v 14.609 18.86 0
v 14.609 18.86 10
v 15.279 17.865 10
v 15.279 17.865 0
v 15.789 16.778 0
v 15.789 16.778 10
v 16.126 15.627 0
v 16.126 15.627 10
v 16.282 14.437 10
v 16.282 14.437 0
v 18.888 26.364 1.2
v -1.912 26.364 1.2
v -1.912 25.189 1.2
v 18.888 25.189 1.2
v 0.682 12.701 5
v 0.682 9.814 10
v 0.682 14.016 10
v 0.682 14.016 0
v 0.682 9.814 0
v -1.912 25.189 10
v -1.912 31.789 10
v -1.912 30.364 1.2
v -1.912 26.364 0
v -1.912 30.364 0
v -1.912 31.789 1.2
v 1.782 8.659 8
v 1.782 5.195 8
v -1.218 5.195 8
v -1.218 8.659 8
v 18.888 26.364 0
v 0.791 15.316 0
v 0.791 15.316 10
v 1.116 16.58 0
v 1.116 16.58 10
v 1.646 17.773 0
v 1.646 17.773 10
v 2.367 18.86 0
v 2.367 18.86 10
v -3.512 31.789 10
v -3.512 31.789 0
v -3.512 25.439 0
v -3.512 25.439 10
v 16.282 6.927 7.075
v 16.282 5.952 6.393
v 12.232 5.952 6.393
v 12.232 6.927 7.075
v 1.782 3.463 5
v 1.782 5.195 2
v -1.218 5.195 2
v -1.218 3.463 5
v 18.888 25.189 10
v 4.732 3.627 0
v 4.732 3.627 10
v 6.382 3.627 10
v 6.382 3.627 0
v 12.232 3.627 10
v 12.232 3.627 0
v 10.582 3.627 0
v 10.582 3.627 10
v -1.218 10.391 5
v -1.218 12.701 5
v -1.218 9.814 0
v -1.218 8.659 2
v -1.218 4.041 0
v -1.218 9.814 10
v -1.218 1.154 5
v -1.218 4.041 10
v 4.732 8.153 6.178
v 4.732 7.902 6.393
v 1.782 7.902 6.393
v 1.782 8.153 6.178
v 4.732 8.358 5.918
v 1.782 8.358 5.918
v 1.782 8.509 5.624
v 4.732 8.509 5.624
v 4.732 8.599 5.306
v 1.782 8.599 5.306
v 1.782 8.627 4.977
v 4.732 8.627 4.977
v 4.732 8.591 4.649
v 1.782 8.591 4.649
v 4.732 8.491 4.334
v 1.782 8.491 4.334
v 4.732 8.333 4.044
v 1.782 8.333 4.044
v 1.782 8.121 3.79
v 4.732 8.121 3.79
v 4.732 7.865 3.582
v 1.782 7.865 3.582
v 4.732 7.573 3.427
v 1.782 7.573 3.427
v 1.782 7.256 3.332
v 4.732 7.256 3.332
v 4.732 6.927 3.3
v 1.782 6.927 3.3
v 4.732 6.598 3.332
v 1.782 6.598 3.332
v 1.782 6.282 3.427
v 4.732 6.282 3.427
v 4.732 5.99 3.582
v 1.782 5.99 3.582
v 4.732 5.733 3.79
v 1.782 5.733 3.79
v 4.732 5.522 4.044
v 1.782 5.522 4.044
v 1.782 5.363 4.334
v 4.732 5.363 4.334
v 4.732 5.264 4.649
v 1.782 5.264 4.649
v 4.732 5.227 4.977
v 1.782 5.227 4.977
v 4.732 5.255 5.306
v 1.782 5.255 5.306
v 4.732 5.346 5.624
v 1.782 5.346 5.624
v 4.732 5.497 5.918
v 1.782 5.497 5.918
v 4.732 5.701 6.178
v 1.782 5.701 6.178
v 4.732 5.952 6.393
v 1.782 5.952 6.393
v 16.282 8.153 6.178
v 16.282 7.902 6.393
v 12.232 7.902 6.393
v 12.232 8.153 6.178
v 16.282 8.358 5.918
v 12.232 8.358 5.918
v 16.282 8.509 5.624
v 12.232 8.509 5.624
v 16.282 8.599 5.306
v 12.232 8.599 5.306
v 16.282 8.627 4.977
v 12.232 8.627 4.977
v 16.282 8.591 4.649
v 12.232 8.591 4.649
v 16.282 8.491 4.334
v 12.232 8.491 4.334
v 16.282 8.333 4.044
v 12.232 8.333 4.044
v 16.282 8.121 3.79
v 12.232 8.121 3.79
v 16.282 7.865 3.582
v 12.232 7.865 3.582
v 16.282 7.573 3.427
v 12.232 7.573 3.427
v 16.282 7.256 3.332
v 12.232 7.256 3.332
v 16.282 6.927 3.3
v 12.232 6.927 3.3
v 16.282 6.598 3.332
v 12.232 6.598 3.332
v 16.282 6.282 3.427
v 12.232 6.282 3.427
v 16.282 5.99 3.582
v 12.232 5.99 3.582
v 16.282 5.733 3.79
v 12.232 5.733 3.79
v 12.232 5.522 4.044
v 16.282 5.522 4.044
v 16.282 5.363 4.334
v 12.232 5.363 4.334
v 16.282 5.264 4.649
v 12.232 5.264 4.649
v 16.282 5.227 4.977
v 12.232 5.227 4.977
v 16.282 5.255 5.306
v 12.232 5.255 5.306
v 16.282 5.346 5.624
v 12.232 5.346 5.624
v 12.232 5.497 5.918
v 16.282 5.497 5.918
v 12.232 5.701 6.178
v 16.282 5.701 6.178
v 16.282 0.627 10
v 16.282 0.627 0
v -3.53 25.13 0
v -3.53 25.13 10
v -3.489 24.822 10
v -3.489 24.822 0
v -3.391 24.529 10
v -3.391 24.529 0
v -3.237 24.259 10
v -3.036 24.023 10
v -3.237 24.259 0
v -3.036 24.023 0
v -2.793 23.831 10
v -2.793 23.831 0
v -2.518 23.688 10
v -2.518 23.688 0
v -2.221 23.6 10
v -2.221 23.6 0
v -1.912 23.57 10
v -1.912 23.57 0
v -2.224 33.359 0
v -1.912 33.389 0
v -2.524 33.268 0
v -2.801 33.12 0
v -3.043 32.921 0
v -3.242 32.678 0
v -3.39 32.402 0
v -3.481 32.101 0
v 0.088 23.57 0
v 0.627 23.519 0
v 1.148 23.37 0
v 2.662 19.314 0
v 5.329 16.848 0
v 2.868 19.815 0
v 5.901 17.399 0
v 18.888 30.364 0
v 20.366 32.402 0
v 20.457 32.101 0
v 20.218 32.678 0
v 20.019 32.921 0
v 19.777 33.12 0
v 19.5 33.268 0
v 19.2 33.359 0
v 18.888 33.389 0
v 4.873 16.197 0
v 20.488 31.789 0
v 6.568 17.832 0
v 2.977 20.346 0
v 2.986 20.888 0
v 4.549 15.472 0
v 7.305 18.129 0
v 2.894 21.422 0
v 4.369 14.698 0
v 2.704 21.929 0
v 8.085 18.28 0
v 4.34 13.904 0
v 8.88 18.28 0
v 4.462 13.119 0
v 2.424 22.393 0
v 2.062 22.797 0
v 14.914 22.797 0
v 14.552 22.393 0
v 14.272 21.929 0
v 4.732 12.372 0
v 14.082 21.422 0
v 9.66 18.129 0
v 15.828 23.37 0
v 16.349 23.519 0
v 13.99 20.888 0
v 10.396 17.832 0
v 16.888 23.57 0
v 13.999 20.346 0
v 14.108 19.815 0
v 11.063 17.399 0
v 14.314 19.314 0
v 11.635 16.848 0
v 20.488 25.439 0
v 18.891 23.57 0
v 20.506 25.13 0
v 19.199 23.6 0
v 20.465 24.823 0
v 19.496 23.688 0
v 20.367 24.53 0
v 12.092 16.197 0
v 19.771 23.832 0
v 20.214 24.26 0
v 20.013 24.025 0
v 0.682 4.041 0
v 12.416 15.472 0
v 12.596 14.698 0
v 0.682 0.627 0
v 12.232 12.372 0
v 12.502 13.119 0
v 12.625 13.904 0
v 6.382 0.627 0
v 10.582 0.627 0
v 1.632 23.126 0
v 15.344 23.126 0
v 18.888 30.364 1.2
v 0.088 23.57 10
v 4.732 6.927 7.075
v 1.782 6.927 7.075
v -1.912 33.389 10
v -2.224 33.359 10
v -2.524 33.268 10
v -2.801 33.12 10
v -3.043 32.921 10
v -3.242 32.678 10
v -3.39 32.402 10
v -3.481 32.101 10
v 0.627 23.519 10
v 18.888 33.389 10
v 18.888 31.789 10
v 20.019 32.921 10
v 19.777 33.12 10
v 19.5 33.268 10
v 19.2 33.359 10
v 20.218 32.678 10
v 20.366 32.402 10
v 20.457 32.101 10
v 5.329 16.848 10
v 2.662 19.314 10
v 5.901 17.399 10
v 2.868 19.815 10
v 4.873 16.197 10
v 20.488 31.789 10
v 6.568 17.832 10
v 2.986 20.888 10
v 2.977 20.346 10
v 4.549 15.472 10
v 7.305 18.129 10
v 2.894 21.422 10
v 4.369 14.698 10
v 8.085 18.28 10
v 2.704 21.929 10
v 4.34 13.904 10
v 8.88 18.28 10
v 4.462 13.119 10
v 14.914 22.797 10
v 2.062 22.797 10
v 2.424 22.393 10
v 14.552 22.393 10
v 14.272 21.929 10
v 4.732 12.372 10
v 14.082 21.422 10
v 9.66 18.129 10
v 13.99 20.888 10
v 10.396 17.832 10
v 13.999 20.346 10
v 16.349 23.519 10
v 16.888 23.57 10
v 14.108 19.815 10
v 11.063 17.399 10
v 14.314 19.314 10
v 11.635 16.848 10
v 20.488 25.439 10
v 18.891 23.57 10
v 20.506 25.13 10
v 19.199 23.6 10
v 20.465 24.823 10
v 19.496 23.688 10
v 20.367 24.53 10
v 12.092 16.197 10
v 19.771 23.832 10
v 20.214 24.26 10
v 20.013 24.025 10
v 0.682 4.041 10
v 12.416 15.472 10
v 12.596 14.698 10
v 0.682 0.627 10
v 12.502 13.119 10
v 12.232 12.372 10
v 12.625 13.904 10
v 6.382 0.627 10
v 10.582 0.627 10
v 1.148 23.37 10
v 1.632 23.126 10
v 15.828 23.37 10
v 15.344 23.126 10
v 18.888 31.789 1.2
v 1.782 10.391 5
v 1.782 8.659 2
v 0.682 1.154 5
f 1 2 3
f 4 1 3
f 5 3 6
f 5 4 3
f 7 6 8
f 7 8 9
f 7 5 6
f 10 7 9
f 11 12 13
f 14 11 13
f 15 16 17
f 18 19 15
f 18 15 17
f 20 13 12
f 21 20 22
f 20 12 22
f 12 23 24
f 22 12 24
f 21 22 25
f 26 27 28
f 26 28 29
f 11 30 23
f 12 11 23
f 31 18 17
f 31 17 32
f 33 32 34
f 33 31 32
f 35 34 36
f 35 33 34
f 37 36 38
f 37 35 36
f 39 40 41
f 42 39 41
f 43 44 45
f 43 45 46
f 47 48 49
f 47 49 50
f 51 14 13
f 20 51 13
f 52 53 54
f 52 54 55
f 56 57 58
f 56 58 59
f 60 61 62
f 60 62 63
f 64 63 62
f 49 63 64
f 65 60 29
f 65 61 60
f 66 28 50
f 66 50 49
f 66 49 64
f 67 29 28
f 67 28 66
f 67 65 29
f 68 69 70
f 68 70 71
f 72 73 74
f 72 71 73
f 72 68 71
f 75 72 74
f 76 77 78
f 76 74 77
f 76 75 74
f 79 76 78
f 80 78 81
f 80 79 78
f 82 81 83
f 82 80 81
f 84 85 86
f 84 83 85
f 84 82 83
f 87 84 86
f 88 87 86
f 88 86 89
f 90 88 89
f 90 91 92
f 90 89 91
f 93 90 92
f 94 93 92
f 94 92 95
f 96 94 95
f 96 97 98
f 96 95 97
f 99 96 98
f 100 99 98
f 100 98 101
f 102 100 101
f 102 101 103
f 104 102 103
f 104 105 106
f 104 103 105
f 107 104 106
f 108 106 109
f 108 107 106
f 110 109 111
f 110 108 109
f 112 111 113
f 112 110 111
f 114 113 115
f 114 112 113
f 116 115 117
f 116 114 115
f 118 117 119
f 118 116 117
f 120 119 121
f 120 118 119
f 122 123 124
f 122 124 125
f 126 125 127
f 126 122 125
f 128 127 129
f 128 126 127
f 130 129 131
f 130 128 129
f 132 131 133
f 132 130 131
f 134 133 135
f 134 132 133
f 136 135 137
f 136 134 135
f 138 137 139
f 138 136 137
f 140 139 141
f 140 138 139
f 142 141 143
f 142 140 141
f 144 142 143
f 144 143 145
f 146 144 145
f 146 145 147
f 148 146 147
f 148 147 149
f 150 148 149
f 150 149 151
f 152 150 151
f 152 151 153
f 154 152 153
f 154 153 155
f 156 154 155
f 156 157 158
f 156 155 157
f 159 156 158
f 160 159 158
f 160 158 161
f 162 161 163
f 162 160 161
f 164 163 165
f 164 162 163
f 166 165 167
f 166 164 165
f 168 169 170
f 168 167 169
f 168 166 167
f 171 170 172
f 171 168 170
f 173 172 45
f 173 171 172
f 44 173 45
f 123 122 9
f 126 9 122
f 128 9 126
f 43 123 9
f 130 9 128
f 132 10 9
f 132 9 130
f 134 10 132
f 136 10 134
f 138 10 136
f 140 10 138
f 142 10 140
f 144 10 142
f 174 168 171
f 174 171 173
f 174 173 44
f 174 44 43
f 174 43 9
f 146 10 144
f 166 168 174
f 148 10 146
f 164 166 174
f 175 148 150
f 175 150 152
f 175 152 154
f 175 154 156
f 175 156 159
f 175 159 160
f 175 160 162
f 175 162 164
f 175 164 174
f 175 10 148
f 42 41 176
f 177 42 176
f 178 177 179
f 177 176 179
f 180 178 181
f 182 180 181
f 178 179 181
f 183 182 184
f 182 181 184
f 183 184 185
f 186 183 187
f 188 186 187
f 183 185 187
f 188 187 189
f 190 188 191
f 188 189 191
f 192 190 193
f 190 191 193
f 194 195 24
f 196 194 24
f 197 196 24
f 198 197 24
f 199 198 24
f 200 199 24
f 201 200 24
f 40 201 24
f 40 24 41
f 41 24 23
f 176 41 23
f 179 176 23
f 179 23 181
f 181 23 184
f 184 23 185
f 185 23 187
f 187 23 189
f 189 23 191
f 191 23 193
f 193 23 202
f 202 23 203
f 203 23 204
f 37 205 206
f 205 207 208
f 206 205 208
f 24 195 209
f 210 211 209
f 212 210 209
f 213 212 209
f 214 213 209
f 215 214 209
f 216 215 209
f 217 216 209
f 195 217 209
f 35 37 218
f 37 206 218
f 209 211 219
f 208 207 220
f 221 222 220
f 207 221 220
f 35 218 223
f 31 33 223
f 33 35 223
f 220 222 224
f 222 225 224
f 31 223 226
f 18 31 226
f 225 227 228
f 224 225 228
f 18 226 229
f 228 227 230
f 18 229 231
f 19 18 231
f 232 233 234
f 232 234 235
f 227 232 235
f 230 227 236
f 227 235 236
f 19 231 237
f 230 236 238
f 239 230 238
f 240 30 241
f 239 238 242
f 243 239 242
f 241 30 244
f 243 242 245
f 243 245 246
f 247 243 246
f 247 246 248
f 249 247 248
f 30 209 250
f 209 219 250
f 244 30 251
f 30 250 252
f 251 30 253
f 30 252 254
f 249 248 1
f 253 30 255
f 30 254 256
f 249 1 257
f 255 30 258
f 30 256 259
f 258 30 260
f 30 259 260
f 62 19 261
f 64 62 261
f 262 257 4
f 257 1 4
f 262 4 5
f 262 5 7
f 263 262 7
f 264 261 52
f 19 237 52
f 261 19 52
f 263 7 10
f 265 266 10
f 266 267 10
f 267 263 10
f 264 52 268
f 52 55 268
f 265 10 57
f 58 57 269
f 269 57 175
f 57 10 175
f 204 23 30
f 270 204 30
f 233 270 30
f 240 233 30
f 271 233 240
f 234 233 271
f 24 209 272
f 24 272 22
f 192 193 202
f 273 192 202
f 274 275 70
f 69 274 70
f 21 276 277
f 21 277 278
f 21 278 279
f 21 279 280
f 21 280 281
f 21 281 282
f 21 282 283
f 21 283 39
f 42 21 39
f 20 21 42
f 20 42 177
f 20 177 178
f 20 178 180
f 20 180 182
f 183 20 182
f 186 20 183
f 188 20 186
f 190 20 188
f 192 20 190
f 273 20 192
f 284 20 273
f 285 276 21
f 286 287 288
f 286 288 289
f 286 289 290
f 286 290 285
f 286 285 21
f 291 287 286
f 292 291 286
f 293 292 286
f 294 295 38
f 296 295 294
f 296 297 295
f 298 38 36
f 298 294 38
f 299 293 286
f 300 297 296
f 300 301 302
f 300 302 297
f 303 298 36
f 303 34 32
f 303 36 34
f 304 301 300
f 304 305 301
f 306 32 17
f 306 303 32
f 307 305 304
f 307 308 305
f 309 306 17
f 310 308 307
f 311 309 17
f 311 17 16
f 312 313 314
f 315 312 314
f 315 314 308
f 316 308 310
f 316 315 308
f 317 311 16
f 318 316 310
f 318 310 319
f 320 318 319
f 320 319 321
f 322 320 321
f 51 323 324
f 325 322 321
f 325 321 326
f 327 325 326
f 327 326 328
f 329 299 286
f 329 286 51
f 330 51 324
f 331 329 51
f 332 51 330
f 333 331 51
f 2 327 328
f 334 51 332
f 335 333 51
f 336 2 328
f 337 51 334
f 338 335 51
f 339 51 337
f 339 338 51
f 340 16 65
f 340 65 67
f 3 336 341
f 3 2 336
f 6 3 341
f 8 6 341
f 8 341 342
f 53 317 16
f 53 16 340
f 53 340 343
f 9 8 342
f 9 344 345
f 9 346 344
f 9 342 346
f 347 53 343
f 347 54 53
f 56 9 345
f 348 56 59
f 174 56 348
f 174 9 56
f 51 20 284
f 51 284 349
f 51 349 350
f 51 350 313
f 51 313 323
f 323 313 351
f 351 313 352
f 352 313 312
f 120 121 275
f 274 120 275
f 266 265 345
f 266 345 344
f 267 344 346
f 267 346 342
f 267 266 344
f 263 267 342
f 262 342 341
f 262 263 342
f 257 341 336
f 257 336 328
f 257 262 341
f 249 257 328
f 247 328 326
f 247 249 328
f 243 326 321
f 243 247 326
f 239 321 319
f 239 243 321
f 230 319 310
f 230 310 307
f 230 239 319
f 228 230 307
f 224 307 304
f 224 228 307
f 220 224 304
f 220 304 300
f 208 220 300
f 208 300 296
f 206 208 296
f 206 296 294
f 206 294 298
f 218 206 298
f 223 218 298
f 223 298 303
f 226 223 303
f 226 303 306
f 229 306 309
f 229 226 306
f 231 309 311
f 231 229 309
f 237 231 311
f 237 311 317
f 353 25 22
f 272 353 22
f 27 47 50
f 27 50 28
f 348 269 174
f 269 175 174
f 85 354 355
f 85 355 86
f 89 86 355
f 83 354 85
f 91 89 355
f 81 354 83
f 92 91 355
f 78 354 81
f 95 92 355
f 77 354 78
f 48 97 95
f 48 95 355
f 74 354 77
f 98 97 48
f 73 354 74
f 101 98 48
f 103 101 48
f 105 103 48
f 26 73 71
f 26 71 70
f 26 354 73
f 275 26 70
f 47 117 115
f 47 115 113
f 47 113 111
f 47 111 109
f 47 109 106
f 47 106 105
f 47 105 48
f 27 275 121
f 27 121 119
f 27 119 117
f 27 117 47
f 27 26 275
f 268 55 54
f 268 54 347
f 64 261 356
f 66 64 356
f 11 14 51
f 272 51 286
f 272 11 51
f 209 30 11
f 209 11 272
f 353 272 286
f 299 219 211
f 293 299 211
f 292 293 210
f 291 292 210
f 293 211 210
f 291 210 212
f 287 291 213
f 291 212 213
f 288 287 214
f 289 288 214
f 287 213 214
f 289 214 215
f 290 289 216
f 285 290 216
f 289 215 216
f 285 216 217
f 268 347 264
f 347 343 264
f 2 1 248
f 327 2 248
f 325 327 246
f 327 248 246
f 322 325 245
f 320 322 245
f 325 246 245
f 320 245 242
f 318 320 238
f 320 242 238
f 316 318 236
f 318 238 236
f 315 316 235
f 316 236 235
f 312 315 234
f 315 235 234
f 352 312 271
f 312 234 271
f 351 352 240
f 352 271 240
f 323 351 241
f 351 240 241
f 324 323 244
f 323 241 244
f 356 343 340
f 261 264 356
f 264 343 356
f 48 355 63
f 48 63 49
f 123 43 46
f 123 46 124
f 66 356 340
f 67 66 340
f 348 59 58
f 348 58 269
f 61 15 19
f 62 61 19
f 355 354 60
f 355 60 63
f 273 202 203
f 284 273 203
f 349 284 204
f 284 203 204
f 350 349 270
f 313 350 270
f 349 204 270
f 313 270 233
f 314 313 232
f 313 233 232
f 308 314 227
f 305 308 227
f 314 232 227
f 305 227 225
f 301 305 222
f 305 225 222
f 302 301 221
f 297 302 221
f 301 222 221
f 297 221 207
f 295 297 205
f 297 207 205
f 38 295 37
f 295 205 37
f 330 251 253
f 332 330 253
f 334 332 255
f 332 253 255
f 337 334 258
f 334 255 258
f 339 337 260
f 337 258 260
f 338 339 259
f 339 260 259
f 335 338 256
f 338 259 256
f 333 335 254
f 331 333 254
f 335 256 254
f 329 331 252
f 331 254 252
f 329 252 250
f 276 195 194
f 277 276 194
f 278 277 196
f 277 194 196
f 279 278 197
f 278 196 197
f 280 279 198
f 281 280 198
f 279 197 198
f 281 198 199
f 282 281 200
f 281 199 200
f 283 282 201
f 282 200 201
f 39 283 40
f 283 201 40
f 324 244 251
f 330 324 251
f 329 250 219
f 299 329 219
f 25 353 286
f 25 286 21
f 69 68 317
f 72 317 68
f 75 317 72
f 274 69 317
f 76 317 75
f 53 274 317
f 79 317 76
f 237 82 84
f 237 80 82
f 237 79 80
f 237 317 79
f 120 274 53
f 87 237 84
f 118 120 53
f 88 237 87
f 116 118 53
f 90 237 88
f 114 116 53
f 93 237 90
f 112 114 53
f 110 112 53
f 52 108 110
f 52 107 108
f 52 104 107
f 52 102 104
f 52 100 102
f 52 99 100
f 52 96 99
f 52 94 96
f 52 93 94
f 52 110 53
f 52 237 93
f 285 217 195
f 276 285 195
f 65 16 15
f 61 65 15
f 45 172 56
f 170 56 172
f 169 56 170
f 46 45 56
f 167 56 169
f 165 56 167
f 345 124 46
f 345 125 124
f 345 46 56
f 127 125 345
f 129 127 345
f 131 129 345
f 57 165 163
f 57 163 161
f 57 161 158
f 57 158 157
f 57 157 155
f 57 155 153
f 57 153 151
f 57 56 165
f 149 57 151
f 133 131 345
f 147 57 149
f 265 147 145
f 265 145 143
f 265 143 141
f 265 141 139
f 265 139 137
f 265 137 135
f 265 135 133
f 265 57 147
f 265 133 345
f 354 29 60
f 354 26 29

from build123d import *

# Parameters (mm, degrees)
BOSS_EXTRUDE1_DEPTH   = 10
CUT_EXTRUDE6_DEPTH    = 29.232073959
BOSS_EXTRUDE4_DEPTH   = 1.9
CUT_EXTRUDE7_DEPTH    = 1.1
BOSS_EXTRUDE5_START   = -10
SKETCH31_W            = 6.6
SKETCH31_H            = 20.8
BOSS_EXTRUDE5_DEPTH   = 10
SKETCH32_W            = 1.175
SKETCH32_H            = 20.8
SKETCH32_W_2          = 1.425
BOSS_EXTRUDE6_DEPTH   = 1.2
SKETCH33_W            = 3
SKETCH33_H            = 10
BOSS_EXTRUDE7_DEPTH   = 1.65
SKETCH34_W            = 3
SKETCH34_H            = 10
BOSS_EXTRUDE8_DEPTH   = 1.65
BODY_MOVE_COPY1_ANGLE = 180


with BuildPart() as part:
    # Sketch1 → Boss-Extrude1 (new body)
    with BuildSketch(Plane.XY):
        with BuildLine():
            Line((7.490021902, 0), (21.300000001, 0))
            Line((21.300000001, 0), (21.300000001, 4.05))
            Line((21.300000001, 4.05), (9.555596341, 4.05))
            ThreePointArc((9.555596341, 4.05), (3.627957458, 7.8), (9.555596341, 11.55))
            Line((9.555596341, 11.55), (21.300000001, 11.55))
            Line((21.300000001, 11.55), (21.300000001, 15.6))
            Line((21.300000001, 15.6), (7.911262801, 15.6))
            ThreePointArc((7.911262801, 15.6), (0.108419667, 8.005009917), (7.490021902, 0))
        make_face()
    extrude(amount=-BOSS_EXTRUDE1_DEPTH)

    # Sketch19 → Cut-Extrude6 (cut, through all)
    with BuildSketch(Plane.XZ):
        with BuildLine():
            Line((15.975079943, -6.392558475), (15.000000001, -7.075316801))
            Line((15.000000001, -7.075316801), (14.024920059, -6.392558475))
            ThreePointArc((14.024920059, -6.392558475), (15.000000001, -3.3), (15.975079943, -6.392558475))
        make_face()
    extrude(amount=-CUT_EXTRUDE6_DEPTH, mode=Mode.SUBTRACT)

    # Sketch21 → Boss-Extrude4 (add)
    with BuildSketch(Plane(origin=(0, 15.6, 0), x_dir=(1, 0, 0), z_dir=(0, 1, 0))):
        Polygon((20.773502693, 5), (17.886751347, 10), (12.113248655, 10), (9.226497309, 5), (12.113248655, 0), (17.886751347, 0), align=None)
        Polygon((13.267949194, 8), (11.535898386, 5), (13.267949194, 2), (16.732050809, 2), (18.464101616, 5), (16.732050809, 8), align=None, mode=Mode.SUBTRACT)
    extrude(amount=BOSS_EXTRUDE4_DEPTH)

    # Sketch22 → Cut-Extrude7 (cut)
    with BuildSketch(Plane(origin=(0, 15.6, 0), x_dir=(1, 0, 0), z_dir=(0, 1, 0))):
        Polygon((16.732050809, 8), (13.267949194, 8), (11.535898386, 5), (13.267949194, 2), (16.732050809, 2), (18.464101616, 5), align=None)
    extrude(amount=-CUT_EXTRUDE7_DEPTH, mode=Mode.SUBTRACT)

    # Sketch31 → Boss-Extrude5 (add)
    with BuildSketch(Plane(origin=(0, 0, -10), x_dir=(-1, 0, 0), z_dir=(0, 0, -1)).offset(BOSS_EXTRUDE5_START)):
        with BuildLine():
            Line((1.642634889, 18.194312696), (1.642634889, 16.194312696))
            ThreePointArc((1.642634889, 16.194312696), (0.002167009, 13.578091054), (-3.067375979, 13.915220696))
            ThreePointArc((-3.067375979, 13.915220696), (-0.105575497, 7.794312696), (-3.067375979, 1.673404696))
            ThreePointArc((-3.067375979, 1.673404696), (0.002167009, 2.010534337), (1.642634889, -0.605687304))
            Line((1.642634889, -0.605687304), (1.642634889, -2.608681933))
            ThreePointArc((1.642634889, -2.608681933), (2.210176801, -3.836976077), (3.512045594, -4.205687304))
            Line((3.512045594, -4.205687304), (9.862045594, -4.205687304))
            ThreePointArc((9.862045594, -4.205687304), (10.993416444, -3.737058154), (11.462045594, -2.605687304))
            Line((11.462045594, -2.605687304), (11.462045594, 18.194312696))
            ThreePointArc((11.462045594, 18.194312696), (10.993416444, 19.325683546), (9.862045594, 19.794312696))
            Line((9.862045594, 19.794312696), (3.512027658, 19.794312696))
            ThreePointArc((3.512027658, 19.794312696), (2.209033865, 19.424620515), (1.642634889, 18.194312696))
        make_face()
        with Locations((6.562045594, 7.794312696)):
            Rectangle(SKETCH31_W, SKETCH31_H, mode=Mode.SUBTRACT)
    extrude(amount=BOSS_EXTRUDE5_DEPTH)

    # Sketch32 → Boss-Extrude6 (add)
    with BuildSketch(Plane.XY):
        with Locations((-3.849545594, 7.794312696)):
            Rectangle(SKETCH32_W, SKETCH32_H)
        with Locations((-9.149545594, 7.794312696)):
            Rectangle(SKETCH32_W_2, SKETCH32_H)
    extrude(amount=-BOSS_EXTRUDE6_DEPTH)

    # Sketch33 → Boss-Extrude7 (add)
    with BuildSketch(Plane.XZ.offset(-11.55)):
        with Locations((19.800000001, -5)):
            Rectangle(SKETCH33_W, SKETCH33_H)
    extrude(amount=BOSS_EXTRUDE7_DEPTH)

    # Sketch34 → Boss-Extrude8 (add)
    with BuildSketch(Plane(origin=(0, 4.05, 0), x_dir=(1, 0, 0), z_dir=(0, 1, 0))):
        with Locations((19.800000001, 5)):
            Rectangle(SKETCH34_W, SKETCH34_H)
    extrude(amount=BOSS_EXTRUDE8_DEPTH)


with BuildPart() as part_1:
    # Body-Move/Copy1: read off the stored shape, not the designer's step
    # Body-Move/Copy1: moved
    add(part.part.moved(Location((-21.9272776, -16.282285, 0))).rotate(Axis((0, 0, 0), (0.7071067812, -0.7071067812, 0)), BODY_MOVE_COPY1_ANGLE))


solid = part_1.part
